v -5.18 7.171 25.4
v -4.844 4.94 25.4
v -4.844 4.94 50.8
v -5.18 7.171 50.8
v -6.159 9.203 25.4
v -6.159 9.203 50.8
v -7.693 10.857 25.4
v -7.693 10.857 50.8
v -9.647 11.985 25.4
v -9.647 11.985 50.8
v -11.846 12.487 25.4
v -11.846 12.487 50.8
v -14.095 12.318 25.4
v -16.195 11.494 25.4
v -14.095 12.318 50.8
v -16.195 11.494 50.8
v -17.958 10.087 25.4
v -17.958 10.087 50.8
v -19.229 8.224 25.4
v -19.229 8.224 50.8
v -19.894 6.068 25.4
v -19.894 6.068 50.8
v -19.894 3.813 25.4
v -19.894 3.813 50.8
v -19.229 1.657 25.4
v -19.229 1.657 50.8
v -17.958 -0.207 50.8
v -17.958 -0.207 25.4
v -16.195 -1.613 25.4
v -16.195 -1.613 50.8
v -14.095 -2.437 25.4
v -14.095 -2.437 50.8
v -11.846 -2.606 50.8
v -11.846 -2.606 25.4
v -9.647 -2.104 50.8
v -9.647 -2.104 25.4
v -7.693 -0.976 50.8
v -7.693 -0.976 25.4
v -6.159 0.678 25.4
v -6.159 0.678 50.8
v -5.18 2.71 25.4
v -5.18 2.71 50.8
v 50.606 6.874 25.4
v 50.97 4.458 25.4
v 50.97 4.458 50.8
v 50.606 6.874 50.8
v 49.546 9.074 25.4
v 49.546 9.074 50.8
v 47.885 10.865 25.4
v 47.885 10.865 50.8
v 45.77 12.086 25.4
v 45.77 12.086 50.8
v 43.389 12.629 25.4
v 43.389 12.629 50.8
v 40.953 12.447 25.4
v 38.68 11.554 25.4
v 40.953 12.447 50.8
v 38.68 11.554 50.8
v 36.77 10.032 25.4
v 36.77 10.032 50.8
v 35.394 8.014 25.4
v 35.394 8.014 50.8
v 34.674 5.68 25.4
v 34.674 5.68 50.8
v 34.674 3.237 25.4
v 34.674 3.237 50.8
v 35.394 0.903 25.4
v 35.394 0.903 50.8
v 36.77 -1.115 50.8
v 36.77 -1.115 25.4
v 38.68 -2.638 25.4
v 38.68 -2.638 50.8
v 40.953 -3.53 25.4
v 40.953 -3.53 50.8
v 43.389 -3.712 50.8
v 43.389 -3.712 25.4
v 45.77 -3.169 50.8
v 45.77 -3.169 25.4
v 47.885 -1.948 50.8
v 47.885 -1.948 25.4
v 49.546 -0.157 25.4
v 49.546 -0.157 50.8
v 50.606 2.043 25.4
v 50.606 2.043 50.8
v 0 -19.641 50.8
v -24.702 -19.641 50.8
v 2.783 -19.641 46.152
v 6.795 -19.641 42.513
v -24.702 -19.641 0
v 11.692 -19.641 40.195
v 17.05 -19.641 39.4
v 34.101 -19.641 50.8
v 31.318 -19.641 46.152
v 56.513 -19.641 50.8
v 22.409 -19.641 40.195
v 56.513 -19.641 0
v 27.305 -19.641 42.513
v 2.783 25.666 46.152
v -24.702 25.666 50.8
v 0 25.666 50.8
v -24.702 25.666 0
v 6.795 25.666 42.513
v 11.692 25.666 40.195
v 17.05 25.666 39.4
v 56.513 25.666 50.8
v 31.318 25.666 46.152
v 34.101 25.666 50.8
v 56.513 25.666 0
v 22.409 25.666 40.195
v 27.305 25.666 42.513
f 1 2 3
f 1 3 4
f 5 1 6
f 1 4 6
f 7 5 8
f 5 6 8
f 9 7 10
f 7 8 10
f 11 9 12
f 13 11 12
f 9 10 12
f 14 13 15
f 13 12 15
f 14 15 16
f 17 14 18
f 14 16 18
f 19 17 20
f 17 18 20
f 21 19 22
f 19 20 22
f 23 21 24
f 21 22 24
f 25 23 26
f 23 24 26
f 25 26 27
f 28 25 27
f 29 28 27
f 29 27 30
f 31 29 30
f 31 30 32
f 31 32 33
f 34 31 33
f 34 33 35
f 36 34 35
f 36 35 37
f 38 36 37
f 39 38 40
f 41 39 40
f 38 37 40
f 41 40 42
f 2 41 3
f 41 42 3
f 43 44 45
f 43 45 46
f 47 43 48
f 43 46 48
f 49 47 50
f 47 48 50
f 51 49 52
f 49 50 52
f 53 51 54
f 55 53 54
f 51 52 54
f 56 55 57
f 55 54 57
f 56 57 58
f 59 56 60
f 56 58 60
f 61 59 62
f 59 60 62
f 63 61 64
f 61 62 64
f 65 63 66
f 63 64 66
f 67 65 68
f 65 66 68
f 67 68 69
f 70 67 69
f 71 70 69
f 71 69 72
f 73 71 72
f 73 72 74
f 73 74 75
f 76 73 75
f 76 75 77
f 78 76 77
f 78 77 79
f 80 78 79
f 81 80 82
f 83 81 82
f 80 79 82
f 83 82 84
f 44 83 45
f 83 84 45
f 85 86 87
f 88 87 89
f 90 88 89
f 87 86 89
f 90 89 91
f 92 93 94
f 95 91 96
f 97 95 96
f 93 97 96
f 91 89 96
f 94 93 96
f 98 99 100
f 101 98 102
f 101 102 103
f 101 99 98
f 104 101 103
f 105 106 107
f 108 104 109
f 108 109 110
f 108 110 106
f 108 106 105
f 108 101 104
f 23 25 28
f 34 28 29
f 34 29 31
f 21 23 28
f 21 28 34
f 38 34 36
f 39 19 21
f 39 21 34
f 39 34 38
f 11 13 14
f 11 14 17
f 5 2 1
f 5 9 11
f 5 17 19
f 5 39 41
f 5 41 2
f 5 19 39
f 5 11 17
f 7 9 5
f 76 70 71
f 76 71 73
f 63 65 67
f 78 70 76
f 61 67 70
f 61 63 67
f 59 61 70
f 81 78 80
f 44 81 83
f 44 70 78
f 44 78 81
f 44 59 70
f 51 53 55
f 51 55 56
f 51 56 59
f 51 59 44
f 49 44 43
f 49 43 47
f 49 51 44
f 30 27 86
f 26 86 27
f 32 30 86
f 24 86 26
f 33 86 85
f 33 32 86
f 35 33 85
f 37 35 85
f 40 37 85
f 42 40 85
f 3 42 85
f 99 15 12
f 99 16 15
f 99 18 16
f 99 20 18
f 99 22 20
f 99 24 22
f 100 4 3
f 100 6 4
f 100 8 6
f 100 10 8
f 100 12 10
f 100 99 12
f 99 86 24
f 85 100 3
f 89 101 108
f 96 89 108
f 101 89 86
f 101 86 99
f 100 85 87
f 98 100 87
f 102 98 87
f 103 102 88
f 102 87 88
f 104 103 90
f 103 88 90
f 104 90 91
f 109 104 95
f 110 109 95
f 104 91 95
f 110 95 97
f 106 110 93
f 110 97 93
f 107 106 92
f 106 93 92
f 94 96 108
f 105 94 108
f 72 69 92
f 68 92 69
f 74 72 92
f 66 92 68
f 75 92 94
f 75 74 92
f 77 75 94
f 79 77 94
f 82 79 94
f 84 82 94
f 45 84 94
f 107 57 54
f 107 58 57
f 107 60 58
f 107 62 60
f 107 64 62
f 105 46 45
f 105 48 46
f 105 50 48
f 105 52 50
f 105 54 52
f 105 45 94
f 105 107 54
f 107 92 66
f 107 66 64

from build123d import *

# Parameters (mm, degrees)
F0_W     = 81.2149718404
F0_H     = 45.3068669885
F1_DEPTH = 50.8
F2_R     = 7.5673646555
F2_R_2   = 8.1937983632
F3_DEPTH = 25.4
F5_DEPTH = 25.4
F7_DEPTH = 25.4


with BuildPart() as f1:
    # F0 (on Top) → F1 (new body)
    with BuildSketch(Plane.XY):
        with Locations((15.9056037664, 3.0124252662)):
            Rectangle(F0_W, F0_H)
    extrude(amount=F1_DEPTH)

    # F2 (on face) → F3 (cut)
    with BuildSketch(Plane.XY.offset(50.8)):
        with Locations((-12.4111901969, 4.940376617)):
            Circle(F2_R)
        with Locations((42.7764281631, 4.4583887793)):
            Circle(F2_R_2)
    extrude(amount=-F3_DEPTH, mode=Mode.SUBTRACT)

    # F4 (on face) → F5 (cut)
    with BuildSketch(Plane.XZ.offset(19.6410082281)):
        with BuildLine():
            Line((34.1006480157, 50.8), (0, 50.8))
            ThreePointArc((0, 50.8), (17.0503240079, 39.4000553567), (34.1006480157, 50.8))
        make_face()
    extrude(amount=-F5_DEPTH, mode=Mode.SUBTRACT)

    # F6 (on face) → F7 (cut)
    with BuildSketch(Plane.XZ.offset(-5.7589917719)):
        with BuildLine():
            Line((34.1006480157, 50.8), (0, 50.8))
            ThreePointArc((0, 50.8), (17.0503240079, 39.4000553567), (34.1006480157, 50.8))
        make_face()
    extrude(amount=-F7_DEPTH, mode=Mode.SUBTRACT)


solid = f1.part
